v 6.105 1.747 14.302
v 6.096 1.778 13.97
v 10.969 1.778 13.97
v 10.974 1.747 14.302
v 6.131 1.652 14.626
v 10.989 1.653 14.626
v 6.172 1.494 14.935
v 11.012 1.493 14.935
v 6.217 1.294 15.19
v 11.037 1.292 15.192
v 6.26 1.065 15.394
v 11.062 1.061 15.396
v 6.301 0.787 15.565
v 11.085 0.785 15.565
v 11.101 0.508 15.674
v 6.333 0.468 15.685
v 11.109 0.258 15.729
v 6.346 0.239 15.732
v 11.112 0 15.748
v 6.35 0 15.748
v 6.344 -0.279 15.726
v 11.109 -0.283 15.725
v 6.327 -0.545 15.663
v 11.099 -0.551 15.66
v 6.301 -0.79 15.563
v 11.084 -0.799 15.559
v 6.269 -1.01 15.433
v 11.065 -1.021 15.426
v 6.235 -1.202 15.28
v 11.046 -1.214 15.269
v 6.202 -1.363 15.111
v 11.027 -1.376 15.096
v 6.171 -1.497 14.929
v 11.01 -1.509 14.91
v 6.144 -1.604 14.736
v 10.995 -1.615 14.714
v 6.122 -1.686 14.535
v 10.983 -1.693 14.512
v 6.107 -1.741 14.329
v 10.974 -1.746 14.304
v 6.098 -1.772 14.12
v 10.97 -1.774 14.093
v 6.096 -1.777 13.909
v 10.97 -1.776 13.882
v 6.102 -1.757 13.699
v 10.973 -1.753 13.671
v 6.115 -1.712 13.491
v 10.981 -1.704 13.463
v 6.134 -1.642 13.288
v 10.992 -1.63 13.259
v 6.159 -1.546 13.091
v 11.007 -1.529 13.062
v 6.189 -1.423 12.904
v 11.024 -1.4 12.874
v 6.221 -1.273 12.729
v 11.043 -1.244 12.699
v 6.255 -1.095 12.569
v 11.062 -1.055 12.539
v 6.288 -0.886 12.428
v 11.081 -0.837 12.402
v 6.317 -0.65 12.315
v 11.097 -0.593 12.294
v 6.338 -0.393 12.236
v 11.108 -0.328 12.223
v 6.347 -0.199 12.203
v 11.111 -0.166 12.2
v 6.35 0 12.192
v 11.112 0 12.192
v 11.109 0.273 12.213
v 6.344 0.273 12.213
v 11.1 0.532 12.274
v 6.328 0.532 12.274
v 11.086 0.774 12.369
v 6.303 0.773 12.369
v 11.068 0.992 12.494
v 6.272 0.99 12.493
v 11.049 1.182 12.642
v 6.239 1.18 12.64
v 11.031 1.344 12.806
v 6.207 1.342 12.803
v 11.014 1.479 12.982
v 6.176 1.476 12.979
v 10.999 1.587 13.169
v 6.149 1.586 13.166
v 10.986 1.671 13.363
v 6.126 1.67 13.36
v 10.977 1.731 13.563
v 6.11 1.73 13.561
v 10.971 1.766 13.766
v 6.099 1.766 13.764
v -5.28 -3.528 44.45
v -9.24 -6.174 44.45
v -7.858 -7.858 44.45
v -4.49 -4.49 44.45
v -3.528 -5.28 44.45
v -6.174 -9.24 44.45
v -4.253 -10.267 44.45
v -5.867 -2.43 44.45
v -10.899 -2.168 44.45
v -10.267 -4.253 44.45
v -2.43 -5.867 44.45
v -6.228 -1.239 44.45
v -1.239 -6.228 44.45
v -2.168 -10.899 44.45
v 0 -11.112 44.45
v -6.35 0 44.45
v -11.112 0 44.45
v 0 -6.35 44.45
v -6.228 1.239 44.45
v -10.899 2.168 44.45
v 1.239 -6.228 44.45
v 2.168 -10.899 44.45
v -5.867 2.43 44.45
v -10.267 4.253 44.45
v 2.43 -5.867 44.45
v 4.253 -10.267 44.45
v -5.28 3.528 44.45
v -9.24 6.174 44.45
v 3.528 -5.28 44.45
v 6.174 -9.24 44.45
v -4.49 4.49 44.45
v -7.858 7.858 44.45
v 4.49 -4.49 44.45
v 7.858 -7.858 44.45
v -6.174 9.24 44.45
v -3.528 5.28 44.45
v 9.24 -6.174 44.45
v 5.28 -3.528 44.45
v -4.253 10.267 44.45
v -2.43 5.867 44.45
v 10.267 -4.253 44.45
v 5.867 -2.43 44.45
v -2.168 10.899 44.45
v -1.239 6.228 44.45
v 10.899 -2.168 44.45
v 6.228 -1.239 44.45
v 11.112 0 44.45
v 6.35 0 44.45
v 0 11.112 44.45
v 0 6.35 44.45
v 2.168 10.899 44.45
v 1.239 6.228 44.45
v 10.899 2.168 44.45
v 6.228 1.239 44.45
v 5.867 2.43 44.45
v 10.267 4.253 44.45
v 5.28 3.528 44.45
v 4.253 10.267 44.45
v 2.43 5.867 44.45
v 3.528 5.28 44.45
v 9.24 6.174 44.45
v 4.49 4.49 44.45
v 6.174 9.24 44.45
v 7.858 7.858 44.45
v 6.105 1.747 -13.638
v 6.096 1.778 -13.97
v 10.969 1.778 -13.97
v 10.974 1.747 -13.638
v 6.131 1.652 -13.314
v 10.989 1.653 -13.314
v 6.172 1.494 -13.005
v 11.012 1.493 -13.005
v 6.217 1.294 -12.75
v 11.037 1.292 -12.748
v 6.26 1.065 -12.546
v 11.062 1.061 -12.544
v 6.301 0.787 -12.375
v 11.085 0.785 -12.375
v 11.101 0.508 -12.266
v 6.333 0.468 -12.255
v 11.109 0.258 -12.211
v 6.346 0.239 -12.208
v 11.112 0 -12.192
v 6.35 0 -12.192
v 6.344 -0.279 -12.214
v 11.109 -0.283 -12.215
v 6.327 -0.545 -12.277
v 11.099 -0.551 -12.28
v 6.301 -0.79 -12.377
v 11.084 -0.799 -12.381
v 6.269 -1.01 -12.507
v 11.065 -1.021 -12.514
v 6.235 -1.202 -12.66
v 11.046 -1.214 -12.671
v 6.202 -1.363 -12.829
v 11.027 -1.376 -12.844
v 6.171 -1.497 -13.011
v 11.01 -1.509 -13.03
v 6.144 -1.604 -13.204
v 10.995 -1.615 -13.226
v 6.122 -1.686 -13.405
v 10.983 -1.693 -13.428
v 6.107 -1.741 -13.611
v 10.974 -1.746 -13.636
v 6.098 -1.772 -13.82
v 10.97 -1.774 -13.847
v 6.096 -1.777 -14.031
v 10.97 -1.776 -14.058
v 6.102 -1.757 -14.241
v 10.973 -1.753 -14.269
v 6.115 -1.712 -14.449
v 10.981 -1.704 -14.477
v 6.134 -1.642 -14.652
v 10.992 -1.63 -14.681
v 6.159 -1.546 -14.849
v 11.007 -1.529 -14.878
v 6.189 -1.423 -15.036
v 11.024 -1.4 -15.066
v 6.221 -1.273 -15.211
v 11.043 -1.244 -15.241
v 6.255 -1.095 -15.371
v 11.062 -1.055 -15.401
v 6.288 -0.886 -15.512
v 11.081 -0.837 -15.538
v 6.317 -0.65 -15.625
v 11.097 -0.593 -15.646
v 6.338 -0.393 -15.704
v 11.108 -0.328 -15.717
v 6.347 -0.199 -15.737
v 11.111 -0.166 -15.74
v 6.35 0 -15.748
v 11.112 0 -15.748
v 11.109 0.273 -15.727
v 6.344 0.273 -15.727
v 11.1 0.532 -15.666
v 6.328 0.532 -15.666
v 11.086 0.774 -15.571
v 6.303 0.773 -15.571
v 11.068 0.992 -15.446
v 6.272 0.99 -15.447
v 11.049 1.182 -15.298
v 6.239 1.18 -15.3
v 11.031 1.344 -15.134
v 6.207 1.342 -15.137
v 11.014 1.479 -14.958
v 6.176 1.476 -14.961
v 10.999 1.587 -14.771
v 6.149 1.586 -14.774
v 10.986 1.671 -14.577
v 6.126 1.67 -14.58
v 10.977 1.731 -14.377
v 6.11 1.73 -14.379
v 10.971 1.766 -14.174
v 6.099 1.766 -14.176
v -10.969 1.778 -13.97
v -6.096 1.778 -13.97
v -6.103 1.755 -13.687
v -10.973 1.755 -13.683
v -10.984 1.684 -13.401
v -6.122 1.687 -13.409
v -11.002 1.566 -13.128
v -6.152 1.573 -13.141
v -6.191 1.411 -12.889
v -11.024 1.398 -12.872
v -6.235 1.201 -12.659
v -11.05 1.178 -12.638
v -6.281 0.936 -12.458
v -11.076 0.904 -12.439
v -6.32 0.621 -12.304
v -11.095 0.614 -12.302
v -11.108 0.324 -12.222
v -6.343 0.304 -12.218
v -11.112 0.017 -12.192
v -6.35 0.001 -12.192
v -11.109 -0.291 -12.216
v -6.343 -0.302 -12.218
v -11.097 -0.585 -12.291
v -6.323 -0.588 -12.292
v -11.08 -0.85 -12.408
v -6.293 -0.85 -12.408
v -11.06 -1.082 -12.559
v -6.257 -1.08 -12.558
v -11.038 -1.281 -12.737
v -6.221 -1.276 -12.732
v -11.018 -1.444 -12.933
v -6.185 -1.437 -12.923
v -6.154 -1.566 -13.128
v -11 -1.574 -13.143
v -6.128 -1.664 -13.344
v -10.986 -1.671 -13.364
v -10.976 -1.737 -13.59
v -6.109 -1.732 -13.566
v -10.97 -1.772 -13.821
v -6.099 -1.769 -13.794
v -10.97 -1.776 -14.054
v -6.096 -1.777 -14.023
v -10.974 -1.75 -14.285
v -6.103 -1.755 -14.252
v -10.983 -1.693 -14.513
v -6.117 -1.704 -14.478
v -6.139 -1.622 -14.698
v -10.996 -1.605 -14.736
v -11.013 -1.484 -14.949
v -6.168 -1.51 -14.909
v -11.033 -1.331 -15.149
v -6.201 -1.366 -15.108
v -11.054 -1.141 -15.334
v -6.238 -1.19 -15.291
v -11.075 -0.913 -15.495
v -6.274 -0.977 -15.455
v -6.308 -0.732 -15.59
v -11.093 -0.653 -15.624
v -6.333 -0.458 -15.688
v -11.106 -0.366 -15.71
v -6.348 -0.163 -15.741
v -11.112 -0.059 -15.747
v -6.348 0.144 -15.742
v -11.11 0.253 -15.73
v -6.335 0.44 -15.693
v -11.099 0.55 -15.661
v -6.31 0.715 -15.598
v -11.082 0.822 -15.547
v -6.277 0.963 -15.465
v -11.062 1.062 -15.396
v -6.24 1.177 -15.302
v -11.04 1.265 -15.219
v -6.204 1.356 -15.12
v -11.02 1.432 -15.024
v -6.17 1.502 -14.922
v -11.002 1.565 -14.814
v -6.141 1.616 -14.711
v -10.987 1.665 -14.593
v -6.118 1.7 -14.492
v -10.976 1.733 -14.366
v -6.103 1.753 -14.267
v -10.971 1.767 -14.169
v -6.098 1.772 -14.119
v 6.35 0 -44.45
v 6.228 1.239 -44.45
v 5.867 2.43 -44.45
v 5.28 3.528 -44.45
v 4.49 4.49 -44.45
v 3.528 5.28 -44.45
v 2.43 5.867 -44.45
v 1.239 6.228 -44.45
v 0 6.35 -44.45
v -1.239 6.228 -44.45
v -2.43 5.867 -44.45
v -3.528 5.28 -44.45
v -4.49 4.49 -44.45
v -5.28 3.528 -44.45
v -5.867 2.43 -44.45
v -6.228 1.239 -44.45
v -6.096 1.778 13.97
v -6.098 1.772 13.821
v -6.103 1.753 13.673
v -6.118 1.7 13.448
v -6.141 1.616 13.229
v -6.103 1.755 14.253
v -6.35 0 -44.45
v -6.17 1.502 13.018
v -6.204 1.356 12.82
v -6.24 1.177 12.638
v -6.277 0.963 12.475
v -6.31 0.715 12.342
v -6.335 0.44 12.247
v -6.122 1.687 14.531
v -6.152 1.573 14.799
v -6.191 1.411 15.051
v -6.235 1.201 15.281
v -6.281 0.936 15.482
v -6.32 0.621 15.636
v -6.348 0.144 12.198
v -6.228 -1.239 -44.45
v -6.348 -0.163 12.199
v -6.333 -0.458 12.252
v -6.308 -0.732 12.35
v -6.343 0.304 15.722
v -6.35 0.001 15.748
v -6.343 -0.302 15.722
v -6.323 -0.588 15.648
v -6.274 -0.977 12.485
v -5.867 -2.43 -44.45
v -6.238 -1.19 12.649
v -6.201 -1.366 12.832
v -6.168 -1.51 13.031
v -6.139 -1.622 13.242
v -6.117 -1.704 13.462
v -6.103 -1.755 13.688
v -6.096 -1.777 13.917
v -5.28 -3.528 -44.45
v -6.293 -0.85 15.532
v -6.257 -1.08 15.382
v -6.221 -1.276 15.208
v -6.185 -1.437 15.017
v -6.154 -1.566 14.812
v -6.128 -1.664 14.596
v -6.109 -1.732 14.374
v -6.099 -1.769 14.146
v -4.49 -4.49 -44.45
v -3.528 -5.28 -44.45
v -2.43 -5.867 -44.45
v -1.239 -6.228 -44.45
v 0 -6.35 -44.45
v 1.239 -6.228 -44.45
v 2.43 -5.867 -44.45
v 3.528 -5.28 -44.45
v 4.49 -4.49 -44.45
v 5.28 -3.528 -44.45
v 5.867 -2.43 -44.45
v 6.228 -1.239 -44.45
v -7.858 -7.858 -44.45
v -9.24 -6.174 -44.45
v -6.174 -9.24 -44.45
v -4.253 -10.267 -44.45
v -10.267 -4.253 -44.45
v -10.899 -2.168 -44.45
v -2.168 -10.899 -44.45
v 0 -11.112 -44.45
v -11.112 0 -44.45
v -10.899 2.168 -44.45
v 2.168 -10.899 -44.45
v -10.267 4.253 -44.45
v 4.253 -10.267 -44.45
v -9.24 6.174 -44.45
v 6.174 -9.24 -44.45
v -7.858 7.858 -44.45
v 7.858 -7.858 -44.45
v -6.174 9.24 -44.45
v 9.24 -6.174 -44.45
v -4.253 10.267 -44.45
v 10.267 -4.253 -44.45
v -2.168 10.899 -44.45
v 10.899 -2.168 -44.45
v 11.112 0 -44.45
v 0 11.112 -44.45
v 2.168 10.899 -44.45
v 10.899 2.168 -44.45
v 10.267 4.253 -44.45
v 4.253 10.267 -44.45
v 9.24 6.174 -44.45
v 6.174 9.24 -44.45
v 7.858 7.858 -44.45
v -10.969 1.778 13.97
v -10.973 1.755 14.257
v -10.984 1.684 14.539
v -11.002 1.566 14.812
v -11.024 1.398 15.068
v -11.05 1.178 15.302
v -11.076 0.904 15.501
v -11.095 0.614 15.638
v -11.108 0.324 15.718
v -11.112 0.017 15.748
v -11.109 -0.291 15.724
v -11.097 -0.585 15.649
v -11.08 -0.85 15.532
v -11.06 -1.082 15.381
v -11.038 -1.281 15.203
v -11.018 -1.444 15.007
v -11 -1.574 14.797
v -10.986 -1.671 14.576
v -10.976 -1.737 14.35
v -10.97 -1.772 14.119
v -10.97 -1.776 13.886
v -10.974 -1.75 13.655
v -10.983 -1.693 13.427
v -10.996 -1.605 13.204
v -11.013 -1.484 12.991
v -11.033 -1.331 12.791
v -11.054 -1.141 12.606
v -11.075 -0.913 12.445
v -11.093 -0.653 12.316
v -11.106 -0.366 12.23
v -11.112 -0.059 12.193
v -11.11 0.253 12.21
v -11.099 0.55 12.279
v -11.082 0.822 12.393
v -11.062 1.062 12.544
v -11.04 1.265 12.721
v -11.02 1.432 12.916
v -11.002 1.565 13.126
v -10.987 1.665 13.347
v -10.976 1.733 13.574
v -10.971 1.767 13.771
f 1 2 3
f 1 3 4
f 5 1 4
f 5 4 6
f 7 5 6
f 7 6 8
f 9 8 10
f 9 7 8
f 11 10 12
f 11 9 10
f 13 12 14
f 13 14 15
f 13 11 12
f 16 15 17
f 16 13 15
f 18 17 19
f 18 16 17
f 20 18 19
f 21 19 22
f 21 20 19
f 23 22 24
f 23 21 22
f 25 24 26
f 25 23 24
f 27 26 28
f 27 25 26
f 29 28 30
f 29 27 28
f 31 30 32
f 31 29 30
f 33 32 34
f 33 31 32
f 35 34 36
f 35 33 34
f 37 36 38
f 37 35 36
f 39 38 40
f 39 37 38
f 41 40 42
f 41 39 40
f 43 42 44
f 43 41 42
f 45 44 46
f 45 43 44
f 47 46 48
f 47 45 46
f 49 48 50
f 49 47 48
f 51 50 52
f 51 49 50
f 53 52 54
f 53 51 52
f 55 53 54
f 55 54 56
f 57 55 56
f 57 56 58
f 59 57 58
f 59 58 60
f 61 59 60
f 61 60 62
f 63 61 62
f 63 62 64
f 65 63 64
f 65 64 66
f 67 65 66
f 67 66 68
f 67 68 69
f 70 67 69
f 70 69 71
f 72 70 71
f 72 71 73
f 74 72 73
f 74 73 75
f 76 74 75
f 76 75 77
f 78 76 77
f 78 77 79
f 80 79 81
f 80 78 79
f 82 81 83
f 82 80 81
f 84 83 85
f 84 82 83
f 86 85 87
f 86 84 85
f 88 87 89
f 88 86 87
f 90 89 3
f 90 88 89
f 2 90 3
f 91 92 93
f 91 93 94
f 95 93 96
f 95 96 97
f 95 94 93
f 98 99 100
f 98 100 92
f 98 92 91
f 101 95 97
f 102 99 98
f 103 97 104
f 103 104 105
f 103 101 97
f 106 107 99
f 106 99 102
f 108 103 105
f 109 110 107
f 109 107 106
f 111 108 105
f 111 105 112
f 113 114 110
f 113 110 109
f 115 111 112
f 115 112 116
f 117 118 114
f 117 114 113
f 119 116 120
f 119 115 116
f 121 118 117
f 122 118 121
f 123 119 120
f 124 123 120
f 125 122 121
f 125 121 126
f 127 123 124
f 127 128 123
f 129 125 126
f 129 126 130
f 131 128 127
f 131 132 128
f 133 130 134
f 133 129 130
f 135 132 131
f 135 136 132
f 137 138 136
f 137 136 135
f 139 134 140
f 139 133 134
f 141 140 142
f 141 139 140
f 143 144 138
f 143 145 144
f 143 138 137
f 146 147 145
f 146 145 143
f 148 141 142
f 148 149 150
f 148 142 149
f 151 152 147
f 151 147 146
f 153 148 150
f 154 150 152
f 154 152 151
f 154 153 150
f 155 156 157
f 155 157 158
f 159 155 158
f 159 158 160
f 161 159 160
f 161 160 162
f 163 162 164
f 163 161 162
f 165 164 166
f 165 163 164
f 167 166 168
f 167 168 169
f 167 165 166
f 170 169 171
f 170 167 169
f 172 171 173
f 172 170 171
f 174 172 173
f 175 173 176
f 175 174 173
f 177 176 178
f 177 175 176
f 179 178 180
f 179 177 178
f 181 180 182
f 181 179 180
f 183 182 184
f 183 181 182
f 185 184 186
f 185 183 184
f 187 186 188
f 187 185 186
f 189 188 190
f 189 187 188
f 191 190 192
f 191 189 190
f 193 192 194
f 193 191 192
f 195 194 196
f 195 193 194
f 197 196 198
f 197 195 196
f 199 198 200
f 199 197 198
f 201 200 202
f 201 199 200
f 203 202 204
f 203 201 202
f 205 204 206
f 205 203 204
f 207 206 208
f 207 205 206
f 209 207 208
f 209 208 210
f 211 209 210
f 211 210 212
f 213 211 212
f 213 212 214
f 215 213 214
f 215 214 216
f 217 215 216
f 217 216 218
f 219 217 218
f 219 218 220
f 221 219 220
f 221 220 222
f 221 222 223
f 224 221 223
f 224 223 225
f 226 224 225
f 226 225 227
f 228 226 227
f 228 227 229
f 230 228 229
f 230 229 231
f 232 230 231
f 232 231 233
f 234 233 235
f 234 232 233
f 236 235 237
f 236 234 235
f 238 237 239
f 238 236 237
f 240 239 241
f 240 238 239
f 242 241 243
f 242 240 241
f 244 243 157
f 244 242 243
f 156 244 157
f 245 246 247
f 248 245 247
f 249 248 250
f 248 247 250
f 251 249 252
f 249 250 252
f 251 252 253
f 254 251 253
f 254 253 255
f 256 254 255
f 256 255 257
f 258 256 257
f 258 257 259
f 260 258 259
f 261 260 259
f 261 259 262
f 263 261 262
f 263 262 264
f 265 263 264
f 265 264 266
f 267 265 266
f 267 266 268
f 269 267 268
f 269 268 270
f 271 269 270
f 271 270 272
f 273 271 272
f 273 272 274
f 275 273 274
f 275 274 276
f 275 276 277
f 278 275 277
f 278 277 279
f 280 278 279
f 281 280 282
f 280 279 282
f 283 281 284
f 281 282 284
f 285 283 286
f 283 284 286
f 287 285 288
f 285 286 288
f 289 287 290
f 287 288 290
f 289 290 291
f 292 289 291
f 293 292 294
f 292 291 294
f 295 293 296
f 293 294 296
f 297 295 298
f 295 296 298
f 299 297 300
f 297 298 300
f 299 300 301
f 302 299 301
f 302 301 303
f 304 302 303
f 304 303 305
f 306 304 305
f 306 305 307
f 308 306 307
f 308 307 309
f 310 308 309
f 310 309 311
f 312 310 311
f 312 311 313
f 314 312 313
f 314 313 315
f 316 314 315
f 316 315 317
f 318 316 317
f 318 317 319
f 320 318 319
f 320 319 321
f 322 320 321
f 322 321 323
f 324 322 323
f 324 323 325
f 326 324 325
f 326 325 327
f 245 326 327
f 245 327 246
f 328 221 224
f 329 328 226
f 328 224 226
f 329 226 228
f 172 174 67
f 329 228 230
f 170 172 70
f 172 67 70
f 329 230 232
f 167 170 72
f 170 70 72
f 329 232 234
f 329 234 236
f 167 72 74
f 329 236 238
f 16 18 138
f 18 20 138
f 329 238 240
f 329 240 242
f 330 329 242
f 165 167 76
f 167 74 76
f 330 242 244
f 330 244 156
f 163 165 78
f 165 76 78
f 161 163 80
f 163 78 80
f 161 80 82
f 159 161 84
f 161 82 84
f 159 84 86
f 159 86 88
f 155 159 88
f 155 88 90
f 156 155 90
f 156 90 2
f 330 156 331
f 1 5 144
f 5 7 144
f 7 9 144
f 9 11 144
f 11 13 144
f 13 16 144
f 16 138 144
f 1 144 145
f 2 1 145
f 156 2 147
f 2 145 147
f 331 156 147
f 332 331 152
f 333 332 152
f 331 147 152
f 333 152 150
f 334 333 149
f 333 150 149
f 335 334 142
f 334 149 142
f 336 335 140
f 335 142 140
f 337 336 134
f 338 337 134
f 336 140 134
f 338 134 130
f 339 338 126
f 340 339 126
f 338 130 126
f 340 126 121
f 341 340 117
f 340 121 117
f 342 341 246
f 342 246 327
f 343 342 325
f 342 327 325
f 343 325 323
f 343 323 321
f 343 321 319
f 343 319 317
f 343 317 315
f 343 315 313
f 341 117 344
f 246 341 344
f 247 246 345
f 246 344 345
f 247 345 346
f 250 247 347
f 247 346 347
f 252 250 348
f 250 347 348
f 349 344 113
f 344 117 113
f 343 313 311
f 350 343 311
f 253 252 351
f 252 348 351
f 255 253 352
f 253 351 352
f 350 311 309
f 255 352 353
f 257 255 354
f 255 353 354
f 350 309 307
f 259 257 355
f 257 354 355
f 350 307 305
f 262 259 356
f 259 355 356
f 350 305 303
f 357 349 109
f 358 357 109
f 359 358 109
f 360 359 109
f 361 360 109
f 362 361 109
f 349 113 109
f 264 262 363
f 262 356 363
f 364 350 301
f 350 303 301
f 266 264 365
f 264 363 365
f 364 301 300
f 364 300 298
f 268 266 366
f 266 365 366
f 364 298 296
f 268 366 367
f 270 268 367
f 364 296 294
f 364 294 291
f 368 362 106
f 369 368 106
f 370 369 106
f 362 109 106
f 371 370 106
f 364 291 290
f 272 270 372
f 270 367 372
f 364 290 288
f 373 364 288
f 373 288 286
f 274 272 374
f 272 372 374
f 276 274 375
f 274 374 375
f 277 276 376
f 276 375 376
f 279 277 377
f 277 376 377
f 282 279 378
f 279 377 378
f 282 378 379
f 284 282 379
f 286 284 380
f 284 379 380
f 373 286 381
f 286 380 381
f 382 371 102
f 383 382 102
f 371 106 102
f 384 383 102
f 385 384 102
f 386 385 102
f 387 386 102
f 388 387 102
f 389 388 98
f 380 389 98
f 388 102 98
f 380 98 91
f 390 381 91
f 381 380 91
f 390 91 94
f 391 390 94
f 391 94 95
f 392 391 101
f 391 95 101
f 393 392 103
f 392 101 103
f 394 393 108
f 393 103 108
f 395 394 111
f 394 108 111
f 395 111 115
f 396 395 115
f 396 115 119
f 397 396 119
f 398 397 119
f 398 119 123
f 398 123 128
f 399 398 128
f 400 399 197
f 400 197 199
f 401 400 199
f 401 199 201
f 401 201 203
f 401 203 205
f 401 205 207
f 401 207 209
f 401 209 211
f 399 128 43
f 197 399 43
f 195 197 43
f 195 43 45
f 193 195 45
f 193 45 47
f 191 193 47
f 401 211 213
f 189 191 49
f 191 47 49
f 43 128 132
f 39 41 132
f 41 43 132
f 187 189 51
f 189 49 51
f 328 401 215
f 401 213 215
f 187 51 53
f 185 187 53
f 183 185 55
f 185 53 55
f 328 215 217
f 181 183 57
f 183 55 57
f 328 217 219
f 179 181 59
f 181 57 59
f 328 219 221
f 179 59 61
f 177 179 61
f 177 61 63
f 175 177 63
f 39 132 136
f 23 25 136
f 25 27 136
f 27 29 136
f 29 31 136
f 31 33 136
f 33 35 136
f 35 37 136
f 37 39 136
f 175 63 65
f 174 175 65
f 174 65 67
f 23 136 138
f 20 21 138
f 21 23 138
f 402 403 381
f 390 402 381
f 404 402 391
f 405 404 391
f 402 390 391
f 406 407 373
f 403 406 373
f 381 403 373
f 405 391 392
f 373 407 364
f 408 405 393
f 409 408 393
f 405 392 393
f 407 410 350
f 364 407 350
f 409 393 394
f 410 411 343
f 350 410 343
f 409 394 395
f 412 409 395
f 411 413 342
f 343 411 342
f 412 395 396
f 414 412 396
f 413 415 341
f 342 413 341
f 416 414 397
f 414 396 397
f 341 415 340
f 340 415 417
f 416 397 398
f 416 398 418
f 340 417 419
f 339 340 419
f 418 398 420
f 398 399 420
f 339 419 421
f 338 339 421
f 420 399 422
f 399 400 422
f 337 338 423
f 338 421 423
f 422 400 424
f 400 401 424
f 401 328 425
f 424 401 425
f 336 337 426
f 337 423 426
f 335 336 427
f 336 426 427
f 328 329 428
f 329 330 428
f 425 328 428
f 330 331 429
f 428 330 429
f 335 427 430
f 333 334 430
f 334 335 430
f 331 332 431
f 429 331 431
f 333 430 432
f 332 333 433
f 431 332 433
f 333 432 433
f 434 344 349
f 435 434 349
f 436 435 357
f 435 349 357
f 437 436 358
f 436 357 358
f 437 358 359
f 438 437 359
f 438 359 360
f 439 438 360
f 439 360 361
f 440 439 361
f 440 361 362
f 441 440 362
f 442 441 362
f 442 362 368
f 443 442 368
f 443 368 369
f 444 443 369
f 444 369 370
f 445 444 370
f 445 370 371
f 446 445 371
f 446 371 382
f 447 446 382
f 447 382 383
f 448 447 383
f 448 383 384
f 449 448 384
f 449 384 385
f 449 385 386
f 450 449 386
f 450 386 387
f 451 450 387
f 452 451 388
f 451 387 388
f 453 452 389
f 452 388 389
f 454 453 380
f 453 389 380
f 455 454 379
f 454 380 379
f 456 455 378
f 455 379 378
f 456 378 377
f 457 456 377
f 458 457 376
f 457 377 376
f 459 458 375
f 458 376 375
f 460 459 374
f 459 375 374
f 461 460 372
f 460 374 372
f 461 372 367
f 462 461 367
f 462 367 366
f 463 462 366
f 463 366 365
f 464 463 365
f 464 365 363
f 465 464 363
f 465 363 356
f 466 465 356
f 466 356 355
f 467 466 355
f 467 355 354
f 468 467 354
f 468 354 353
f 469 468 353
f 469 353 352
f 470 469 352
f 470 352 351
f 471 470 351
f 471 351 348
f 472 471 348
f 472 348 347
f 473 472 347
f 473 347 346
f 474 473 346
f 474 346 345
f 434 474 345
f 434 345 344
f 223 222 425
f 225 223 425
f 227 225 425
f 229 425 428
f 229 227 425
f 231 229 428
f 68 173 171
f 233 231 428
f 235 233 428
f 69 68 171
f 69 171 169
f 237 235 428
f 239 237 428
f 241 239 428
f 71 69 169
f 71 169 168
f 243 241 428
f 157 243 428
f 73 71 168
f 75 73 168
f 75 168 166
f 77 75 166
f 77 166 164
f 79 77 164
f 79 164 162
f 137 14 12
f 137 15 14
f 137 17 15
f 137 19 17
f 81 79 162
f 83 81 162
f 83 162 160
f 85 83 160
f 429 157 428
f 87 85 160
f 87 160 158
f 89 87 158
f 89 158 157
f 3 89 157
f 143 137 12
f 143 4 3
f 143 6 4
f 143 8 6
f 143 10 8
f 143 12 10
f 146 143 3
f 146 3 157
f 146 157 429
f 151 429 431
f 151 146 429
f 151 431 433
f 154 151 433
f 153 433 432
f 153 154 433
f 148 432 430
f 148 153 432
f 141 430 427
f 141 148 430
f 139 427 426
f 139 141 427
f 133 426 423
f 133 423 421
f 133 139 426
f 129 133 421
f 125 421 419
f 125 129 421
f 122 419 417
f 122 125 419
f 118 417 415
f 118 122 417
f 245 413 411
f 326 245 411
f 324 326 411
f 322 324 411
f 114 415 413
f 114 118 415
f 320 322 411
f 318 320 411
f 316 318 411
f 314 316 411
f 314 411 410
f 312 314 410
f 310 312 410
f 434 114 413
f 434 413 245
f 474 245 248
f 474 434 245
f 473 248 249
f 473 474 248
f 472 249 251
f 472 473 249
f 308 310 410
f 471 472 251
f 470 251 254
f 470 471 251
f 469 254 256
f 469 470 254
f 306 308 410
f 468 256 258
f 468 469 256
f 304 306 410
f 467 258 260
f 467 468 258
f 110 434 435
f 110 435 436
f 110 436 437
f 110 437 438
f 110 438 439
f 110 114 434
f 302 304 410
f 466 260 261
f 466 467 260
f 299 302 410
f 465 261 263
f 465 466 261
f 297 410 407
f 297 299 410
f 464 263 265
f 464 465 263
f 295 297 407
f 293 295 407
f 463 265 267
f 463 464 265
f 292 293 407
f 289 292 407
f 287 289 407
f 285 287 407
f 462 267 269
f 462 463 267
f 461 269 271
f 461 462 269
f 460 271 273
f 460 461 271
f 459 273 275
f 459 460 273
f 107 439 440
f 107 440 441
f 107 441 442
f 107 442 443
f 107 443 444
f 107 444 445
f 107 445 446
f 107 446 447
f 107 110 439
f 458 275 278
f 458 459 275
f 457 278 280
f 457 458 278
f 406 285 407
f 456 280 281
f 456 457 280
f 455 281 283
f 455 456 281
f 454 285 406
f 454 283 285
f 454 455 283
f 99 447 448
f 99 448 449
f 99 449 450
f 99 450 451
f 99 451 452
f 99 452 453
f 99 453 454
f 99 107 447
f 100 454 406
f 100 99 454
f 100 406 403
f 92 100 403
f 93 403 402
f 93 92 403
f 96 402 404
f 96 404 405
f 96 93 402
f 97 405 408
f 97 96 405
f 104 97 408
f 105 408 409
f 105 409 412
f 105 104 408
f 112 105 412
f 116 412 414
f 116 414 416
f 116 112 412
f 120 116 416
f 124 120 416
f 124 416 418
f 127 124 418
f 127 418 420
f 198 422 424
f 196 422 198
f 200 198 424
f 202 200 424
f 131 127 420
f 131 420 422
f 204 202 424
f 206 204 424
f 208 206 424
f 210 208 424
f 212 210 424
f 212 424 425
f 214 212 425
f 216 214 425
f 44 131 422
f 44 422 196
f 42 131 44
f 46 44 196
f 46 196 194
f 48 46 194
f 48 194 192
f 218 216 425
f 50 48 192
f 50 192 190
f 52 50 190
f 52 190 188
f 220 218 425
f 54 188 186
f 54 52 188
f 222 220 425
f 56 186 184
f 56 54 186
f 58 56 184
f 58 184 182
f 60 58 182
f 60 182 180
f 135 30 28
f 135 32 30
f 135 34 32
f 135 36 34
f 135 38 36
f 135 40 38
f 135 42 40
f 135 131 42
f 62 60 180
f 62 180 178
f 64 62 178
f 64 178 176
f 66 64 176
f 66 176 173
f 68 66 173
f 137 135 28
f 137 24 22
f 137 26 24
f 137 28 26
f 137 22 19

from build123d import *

# Parameters (mm, degrees)
F0_R          = 11.1125
F1_DEPTH      = 44.45
F2_R          = 6.35
F3_DEPTH      = 88.9
F4_R          = 1.778
F5_DEPTH      = 11.1135
F5_DEPTH_BACK = 11.1135


with BuildPart() as f1:
    # F0 (on Top) → F1 (new body, symmetric)
    with BuildSketch(Plane.XY):
        Circle(F0_R)
    extrude(amount=F1_DEPTH, both=True)

    # F2 (on face) → F3 (cut, through all)
    with BuildSketch(Plane.XY.offset(44.45)):
        Circle(F2_R)
    extrude(amount=-F3_DEPTH, mode=Mode.SUBTRACT)

    # F4 (on Right) → F5 (cut, two sides)
    with BuildSketch(Plane.YZ) as f5_sk:
        with Locations((0, -13.97)):
            Circle(F4_R)
        with Locations((0, 13.97)):
            Circle(F4_R)
    extrude(amount=F5_DEPTH, mode=Mode.SUBTRACT)
    extrude(f5_sk.sketch, amount=-F5_DEPTH_BACK, mode=Mode.SUBTRACT)


solid = f1.part
